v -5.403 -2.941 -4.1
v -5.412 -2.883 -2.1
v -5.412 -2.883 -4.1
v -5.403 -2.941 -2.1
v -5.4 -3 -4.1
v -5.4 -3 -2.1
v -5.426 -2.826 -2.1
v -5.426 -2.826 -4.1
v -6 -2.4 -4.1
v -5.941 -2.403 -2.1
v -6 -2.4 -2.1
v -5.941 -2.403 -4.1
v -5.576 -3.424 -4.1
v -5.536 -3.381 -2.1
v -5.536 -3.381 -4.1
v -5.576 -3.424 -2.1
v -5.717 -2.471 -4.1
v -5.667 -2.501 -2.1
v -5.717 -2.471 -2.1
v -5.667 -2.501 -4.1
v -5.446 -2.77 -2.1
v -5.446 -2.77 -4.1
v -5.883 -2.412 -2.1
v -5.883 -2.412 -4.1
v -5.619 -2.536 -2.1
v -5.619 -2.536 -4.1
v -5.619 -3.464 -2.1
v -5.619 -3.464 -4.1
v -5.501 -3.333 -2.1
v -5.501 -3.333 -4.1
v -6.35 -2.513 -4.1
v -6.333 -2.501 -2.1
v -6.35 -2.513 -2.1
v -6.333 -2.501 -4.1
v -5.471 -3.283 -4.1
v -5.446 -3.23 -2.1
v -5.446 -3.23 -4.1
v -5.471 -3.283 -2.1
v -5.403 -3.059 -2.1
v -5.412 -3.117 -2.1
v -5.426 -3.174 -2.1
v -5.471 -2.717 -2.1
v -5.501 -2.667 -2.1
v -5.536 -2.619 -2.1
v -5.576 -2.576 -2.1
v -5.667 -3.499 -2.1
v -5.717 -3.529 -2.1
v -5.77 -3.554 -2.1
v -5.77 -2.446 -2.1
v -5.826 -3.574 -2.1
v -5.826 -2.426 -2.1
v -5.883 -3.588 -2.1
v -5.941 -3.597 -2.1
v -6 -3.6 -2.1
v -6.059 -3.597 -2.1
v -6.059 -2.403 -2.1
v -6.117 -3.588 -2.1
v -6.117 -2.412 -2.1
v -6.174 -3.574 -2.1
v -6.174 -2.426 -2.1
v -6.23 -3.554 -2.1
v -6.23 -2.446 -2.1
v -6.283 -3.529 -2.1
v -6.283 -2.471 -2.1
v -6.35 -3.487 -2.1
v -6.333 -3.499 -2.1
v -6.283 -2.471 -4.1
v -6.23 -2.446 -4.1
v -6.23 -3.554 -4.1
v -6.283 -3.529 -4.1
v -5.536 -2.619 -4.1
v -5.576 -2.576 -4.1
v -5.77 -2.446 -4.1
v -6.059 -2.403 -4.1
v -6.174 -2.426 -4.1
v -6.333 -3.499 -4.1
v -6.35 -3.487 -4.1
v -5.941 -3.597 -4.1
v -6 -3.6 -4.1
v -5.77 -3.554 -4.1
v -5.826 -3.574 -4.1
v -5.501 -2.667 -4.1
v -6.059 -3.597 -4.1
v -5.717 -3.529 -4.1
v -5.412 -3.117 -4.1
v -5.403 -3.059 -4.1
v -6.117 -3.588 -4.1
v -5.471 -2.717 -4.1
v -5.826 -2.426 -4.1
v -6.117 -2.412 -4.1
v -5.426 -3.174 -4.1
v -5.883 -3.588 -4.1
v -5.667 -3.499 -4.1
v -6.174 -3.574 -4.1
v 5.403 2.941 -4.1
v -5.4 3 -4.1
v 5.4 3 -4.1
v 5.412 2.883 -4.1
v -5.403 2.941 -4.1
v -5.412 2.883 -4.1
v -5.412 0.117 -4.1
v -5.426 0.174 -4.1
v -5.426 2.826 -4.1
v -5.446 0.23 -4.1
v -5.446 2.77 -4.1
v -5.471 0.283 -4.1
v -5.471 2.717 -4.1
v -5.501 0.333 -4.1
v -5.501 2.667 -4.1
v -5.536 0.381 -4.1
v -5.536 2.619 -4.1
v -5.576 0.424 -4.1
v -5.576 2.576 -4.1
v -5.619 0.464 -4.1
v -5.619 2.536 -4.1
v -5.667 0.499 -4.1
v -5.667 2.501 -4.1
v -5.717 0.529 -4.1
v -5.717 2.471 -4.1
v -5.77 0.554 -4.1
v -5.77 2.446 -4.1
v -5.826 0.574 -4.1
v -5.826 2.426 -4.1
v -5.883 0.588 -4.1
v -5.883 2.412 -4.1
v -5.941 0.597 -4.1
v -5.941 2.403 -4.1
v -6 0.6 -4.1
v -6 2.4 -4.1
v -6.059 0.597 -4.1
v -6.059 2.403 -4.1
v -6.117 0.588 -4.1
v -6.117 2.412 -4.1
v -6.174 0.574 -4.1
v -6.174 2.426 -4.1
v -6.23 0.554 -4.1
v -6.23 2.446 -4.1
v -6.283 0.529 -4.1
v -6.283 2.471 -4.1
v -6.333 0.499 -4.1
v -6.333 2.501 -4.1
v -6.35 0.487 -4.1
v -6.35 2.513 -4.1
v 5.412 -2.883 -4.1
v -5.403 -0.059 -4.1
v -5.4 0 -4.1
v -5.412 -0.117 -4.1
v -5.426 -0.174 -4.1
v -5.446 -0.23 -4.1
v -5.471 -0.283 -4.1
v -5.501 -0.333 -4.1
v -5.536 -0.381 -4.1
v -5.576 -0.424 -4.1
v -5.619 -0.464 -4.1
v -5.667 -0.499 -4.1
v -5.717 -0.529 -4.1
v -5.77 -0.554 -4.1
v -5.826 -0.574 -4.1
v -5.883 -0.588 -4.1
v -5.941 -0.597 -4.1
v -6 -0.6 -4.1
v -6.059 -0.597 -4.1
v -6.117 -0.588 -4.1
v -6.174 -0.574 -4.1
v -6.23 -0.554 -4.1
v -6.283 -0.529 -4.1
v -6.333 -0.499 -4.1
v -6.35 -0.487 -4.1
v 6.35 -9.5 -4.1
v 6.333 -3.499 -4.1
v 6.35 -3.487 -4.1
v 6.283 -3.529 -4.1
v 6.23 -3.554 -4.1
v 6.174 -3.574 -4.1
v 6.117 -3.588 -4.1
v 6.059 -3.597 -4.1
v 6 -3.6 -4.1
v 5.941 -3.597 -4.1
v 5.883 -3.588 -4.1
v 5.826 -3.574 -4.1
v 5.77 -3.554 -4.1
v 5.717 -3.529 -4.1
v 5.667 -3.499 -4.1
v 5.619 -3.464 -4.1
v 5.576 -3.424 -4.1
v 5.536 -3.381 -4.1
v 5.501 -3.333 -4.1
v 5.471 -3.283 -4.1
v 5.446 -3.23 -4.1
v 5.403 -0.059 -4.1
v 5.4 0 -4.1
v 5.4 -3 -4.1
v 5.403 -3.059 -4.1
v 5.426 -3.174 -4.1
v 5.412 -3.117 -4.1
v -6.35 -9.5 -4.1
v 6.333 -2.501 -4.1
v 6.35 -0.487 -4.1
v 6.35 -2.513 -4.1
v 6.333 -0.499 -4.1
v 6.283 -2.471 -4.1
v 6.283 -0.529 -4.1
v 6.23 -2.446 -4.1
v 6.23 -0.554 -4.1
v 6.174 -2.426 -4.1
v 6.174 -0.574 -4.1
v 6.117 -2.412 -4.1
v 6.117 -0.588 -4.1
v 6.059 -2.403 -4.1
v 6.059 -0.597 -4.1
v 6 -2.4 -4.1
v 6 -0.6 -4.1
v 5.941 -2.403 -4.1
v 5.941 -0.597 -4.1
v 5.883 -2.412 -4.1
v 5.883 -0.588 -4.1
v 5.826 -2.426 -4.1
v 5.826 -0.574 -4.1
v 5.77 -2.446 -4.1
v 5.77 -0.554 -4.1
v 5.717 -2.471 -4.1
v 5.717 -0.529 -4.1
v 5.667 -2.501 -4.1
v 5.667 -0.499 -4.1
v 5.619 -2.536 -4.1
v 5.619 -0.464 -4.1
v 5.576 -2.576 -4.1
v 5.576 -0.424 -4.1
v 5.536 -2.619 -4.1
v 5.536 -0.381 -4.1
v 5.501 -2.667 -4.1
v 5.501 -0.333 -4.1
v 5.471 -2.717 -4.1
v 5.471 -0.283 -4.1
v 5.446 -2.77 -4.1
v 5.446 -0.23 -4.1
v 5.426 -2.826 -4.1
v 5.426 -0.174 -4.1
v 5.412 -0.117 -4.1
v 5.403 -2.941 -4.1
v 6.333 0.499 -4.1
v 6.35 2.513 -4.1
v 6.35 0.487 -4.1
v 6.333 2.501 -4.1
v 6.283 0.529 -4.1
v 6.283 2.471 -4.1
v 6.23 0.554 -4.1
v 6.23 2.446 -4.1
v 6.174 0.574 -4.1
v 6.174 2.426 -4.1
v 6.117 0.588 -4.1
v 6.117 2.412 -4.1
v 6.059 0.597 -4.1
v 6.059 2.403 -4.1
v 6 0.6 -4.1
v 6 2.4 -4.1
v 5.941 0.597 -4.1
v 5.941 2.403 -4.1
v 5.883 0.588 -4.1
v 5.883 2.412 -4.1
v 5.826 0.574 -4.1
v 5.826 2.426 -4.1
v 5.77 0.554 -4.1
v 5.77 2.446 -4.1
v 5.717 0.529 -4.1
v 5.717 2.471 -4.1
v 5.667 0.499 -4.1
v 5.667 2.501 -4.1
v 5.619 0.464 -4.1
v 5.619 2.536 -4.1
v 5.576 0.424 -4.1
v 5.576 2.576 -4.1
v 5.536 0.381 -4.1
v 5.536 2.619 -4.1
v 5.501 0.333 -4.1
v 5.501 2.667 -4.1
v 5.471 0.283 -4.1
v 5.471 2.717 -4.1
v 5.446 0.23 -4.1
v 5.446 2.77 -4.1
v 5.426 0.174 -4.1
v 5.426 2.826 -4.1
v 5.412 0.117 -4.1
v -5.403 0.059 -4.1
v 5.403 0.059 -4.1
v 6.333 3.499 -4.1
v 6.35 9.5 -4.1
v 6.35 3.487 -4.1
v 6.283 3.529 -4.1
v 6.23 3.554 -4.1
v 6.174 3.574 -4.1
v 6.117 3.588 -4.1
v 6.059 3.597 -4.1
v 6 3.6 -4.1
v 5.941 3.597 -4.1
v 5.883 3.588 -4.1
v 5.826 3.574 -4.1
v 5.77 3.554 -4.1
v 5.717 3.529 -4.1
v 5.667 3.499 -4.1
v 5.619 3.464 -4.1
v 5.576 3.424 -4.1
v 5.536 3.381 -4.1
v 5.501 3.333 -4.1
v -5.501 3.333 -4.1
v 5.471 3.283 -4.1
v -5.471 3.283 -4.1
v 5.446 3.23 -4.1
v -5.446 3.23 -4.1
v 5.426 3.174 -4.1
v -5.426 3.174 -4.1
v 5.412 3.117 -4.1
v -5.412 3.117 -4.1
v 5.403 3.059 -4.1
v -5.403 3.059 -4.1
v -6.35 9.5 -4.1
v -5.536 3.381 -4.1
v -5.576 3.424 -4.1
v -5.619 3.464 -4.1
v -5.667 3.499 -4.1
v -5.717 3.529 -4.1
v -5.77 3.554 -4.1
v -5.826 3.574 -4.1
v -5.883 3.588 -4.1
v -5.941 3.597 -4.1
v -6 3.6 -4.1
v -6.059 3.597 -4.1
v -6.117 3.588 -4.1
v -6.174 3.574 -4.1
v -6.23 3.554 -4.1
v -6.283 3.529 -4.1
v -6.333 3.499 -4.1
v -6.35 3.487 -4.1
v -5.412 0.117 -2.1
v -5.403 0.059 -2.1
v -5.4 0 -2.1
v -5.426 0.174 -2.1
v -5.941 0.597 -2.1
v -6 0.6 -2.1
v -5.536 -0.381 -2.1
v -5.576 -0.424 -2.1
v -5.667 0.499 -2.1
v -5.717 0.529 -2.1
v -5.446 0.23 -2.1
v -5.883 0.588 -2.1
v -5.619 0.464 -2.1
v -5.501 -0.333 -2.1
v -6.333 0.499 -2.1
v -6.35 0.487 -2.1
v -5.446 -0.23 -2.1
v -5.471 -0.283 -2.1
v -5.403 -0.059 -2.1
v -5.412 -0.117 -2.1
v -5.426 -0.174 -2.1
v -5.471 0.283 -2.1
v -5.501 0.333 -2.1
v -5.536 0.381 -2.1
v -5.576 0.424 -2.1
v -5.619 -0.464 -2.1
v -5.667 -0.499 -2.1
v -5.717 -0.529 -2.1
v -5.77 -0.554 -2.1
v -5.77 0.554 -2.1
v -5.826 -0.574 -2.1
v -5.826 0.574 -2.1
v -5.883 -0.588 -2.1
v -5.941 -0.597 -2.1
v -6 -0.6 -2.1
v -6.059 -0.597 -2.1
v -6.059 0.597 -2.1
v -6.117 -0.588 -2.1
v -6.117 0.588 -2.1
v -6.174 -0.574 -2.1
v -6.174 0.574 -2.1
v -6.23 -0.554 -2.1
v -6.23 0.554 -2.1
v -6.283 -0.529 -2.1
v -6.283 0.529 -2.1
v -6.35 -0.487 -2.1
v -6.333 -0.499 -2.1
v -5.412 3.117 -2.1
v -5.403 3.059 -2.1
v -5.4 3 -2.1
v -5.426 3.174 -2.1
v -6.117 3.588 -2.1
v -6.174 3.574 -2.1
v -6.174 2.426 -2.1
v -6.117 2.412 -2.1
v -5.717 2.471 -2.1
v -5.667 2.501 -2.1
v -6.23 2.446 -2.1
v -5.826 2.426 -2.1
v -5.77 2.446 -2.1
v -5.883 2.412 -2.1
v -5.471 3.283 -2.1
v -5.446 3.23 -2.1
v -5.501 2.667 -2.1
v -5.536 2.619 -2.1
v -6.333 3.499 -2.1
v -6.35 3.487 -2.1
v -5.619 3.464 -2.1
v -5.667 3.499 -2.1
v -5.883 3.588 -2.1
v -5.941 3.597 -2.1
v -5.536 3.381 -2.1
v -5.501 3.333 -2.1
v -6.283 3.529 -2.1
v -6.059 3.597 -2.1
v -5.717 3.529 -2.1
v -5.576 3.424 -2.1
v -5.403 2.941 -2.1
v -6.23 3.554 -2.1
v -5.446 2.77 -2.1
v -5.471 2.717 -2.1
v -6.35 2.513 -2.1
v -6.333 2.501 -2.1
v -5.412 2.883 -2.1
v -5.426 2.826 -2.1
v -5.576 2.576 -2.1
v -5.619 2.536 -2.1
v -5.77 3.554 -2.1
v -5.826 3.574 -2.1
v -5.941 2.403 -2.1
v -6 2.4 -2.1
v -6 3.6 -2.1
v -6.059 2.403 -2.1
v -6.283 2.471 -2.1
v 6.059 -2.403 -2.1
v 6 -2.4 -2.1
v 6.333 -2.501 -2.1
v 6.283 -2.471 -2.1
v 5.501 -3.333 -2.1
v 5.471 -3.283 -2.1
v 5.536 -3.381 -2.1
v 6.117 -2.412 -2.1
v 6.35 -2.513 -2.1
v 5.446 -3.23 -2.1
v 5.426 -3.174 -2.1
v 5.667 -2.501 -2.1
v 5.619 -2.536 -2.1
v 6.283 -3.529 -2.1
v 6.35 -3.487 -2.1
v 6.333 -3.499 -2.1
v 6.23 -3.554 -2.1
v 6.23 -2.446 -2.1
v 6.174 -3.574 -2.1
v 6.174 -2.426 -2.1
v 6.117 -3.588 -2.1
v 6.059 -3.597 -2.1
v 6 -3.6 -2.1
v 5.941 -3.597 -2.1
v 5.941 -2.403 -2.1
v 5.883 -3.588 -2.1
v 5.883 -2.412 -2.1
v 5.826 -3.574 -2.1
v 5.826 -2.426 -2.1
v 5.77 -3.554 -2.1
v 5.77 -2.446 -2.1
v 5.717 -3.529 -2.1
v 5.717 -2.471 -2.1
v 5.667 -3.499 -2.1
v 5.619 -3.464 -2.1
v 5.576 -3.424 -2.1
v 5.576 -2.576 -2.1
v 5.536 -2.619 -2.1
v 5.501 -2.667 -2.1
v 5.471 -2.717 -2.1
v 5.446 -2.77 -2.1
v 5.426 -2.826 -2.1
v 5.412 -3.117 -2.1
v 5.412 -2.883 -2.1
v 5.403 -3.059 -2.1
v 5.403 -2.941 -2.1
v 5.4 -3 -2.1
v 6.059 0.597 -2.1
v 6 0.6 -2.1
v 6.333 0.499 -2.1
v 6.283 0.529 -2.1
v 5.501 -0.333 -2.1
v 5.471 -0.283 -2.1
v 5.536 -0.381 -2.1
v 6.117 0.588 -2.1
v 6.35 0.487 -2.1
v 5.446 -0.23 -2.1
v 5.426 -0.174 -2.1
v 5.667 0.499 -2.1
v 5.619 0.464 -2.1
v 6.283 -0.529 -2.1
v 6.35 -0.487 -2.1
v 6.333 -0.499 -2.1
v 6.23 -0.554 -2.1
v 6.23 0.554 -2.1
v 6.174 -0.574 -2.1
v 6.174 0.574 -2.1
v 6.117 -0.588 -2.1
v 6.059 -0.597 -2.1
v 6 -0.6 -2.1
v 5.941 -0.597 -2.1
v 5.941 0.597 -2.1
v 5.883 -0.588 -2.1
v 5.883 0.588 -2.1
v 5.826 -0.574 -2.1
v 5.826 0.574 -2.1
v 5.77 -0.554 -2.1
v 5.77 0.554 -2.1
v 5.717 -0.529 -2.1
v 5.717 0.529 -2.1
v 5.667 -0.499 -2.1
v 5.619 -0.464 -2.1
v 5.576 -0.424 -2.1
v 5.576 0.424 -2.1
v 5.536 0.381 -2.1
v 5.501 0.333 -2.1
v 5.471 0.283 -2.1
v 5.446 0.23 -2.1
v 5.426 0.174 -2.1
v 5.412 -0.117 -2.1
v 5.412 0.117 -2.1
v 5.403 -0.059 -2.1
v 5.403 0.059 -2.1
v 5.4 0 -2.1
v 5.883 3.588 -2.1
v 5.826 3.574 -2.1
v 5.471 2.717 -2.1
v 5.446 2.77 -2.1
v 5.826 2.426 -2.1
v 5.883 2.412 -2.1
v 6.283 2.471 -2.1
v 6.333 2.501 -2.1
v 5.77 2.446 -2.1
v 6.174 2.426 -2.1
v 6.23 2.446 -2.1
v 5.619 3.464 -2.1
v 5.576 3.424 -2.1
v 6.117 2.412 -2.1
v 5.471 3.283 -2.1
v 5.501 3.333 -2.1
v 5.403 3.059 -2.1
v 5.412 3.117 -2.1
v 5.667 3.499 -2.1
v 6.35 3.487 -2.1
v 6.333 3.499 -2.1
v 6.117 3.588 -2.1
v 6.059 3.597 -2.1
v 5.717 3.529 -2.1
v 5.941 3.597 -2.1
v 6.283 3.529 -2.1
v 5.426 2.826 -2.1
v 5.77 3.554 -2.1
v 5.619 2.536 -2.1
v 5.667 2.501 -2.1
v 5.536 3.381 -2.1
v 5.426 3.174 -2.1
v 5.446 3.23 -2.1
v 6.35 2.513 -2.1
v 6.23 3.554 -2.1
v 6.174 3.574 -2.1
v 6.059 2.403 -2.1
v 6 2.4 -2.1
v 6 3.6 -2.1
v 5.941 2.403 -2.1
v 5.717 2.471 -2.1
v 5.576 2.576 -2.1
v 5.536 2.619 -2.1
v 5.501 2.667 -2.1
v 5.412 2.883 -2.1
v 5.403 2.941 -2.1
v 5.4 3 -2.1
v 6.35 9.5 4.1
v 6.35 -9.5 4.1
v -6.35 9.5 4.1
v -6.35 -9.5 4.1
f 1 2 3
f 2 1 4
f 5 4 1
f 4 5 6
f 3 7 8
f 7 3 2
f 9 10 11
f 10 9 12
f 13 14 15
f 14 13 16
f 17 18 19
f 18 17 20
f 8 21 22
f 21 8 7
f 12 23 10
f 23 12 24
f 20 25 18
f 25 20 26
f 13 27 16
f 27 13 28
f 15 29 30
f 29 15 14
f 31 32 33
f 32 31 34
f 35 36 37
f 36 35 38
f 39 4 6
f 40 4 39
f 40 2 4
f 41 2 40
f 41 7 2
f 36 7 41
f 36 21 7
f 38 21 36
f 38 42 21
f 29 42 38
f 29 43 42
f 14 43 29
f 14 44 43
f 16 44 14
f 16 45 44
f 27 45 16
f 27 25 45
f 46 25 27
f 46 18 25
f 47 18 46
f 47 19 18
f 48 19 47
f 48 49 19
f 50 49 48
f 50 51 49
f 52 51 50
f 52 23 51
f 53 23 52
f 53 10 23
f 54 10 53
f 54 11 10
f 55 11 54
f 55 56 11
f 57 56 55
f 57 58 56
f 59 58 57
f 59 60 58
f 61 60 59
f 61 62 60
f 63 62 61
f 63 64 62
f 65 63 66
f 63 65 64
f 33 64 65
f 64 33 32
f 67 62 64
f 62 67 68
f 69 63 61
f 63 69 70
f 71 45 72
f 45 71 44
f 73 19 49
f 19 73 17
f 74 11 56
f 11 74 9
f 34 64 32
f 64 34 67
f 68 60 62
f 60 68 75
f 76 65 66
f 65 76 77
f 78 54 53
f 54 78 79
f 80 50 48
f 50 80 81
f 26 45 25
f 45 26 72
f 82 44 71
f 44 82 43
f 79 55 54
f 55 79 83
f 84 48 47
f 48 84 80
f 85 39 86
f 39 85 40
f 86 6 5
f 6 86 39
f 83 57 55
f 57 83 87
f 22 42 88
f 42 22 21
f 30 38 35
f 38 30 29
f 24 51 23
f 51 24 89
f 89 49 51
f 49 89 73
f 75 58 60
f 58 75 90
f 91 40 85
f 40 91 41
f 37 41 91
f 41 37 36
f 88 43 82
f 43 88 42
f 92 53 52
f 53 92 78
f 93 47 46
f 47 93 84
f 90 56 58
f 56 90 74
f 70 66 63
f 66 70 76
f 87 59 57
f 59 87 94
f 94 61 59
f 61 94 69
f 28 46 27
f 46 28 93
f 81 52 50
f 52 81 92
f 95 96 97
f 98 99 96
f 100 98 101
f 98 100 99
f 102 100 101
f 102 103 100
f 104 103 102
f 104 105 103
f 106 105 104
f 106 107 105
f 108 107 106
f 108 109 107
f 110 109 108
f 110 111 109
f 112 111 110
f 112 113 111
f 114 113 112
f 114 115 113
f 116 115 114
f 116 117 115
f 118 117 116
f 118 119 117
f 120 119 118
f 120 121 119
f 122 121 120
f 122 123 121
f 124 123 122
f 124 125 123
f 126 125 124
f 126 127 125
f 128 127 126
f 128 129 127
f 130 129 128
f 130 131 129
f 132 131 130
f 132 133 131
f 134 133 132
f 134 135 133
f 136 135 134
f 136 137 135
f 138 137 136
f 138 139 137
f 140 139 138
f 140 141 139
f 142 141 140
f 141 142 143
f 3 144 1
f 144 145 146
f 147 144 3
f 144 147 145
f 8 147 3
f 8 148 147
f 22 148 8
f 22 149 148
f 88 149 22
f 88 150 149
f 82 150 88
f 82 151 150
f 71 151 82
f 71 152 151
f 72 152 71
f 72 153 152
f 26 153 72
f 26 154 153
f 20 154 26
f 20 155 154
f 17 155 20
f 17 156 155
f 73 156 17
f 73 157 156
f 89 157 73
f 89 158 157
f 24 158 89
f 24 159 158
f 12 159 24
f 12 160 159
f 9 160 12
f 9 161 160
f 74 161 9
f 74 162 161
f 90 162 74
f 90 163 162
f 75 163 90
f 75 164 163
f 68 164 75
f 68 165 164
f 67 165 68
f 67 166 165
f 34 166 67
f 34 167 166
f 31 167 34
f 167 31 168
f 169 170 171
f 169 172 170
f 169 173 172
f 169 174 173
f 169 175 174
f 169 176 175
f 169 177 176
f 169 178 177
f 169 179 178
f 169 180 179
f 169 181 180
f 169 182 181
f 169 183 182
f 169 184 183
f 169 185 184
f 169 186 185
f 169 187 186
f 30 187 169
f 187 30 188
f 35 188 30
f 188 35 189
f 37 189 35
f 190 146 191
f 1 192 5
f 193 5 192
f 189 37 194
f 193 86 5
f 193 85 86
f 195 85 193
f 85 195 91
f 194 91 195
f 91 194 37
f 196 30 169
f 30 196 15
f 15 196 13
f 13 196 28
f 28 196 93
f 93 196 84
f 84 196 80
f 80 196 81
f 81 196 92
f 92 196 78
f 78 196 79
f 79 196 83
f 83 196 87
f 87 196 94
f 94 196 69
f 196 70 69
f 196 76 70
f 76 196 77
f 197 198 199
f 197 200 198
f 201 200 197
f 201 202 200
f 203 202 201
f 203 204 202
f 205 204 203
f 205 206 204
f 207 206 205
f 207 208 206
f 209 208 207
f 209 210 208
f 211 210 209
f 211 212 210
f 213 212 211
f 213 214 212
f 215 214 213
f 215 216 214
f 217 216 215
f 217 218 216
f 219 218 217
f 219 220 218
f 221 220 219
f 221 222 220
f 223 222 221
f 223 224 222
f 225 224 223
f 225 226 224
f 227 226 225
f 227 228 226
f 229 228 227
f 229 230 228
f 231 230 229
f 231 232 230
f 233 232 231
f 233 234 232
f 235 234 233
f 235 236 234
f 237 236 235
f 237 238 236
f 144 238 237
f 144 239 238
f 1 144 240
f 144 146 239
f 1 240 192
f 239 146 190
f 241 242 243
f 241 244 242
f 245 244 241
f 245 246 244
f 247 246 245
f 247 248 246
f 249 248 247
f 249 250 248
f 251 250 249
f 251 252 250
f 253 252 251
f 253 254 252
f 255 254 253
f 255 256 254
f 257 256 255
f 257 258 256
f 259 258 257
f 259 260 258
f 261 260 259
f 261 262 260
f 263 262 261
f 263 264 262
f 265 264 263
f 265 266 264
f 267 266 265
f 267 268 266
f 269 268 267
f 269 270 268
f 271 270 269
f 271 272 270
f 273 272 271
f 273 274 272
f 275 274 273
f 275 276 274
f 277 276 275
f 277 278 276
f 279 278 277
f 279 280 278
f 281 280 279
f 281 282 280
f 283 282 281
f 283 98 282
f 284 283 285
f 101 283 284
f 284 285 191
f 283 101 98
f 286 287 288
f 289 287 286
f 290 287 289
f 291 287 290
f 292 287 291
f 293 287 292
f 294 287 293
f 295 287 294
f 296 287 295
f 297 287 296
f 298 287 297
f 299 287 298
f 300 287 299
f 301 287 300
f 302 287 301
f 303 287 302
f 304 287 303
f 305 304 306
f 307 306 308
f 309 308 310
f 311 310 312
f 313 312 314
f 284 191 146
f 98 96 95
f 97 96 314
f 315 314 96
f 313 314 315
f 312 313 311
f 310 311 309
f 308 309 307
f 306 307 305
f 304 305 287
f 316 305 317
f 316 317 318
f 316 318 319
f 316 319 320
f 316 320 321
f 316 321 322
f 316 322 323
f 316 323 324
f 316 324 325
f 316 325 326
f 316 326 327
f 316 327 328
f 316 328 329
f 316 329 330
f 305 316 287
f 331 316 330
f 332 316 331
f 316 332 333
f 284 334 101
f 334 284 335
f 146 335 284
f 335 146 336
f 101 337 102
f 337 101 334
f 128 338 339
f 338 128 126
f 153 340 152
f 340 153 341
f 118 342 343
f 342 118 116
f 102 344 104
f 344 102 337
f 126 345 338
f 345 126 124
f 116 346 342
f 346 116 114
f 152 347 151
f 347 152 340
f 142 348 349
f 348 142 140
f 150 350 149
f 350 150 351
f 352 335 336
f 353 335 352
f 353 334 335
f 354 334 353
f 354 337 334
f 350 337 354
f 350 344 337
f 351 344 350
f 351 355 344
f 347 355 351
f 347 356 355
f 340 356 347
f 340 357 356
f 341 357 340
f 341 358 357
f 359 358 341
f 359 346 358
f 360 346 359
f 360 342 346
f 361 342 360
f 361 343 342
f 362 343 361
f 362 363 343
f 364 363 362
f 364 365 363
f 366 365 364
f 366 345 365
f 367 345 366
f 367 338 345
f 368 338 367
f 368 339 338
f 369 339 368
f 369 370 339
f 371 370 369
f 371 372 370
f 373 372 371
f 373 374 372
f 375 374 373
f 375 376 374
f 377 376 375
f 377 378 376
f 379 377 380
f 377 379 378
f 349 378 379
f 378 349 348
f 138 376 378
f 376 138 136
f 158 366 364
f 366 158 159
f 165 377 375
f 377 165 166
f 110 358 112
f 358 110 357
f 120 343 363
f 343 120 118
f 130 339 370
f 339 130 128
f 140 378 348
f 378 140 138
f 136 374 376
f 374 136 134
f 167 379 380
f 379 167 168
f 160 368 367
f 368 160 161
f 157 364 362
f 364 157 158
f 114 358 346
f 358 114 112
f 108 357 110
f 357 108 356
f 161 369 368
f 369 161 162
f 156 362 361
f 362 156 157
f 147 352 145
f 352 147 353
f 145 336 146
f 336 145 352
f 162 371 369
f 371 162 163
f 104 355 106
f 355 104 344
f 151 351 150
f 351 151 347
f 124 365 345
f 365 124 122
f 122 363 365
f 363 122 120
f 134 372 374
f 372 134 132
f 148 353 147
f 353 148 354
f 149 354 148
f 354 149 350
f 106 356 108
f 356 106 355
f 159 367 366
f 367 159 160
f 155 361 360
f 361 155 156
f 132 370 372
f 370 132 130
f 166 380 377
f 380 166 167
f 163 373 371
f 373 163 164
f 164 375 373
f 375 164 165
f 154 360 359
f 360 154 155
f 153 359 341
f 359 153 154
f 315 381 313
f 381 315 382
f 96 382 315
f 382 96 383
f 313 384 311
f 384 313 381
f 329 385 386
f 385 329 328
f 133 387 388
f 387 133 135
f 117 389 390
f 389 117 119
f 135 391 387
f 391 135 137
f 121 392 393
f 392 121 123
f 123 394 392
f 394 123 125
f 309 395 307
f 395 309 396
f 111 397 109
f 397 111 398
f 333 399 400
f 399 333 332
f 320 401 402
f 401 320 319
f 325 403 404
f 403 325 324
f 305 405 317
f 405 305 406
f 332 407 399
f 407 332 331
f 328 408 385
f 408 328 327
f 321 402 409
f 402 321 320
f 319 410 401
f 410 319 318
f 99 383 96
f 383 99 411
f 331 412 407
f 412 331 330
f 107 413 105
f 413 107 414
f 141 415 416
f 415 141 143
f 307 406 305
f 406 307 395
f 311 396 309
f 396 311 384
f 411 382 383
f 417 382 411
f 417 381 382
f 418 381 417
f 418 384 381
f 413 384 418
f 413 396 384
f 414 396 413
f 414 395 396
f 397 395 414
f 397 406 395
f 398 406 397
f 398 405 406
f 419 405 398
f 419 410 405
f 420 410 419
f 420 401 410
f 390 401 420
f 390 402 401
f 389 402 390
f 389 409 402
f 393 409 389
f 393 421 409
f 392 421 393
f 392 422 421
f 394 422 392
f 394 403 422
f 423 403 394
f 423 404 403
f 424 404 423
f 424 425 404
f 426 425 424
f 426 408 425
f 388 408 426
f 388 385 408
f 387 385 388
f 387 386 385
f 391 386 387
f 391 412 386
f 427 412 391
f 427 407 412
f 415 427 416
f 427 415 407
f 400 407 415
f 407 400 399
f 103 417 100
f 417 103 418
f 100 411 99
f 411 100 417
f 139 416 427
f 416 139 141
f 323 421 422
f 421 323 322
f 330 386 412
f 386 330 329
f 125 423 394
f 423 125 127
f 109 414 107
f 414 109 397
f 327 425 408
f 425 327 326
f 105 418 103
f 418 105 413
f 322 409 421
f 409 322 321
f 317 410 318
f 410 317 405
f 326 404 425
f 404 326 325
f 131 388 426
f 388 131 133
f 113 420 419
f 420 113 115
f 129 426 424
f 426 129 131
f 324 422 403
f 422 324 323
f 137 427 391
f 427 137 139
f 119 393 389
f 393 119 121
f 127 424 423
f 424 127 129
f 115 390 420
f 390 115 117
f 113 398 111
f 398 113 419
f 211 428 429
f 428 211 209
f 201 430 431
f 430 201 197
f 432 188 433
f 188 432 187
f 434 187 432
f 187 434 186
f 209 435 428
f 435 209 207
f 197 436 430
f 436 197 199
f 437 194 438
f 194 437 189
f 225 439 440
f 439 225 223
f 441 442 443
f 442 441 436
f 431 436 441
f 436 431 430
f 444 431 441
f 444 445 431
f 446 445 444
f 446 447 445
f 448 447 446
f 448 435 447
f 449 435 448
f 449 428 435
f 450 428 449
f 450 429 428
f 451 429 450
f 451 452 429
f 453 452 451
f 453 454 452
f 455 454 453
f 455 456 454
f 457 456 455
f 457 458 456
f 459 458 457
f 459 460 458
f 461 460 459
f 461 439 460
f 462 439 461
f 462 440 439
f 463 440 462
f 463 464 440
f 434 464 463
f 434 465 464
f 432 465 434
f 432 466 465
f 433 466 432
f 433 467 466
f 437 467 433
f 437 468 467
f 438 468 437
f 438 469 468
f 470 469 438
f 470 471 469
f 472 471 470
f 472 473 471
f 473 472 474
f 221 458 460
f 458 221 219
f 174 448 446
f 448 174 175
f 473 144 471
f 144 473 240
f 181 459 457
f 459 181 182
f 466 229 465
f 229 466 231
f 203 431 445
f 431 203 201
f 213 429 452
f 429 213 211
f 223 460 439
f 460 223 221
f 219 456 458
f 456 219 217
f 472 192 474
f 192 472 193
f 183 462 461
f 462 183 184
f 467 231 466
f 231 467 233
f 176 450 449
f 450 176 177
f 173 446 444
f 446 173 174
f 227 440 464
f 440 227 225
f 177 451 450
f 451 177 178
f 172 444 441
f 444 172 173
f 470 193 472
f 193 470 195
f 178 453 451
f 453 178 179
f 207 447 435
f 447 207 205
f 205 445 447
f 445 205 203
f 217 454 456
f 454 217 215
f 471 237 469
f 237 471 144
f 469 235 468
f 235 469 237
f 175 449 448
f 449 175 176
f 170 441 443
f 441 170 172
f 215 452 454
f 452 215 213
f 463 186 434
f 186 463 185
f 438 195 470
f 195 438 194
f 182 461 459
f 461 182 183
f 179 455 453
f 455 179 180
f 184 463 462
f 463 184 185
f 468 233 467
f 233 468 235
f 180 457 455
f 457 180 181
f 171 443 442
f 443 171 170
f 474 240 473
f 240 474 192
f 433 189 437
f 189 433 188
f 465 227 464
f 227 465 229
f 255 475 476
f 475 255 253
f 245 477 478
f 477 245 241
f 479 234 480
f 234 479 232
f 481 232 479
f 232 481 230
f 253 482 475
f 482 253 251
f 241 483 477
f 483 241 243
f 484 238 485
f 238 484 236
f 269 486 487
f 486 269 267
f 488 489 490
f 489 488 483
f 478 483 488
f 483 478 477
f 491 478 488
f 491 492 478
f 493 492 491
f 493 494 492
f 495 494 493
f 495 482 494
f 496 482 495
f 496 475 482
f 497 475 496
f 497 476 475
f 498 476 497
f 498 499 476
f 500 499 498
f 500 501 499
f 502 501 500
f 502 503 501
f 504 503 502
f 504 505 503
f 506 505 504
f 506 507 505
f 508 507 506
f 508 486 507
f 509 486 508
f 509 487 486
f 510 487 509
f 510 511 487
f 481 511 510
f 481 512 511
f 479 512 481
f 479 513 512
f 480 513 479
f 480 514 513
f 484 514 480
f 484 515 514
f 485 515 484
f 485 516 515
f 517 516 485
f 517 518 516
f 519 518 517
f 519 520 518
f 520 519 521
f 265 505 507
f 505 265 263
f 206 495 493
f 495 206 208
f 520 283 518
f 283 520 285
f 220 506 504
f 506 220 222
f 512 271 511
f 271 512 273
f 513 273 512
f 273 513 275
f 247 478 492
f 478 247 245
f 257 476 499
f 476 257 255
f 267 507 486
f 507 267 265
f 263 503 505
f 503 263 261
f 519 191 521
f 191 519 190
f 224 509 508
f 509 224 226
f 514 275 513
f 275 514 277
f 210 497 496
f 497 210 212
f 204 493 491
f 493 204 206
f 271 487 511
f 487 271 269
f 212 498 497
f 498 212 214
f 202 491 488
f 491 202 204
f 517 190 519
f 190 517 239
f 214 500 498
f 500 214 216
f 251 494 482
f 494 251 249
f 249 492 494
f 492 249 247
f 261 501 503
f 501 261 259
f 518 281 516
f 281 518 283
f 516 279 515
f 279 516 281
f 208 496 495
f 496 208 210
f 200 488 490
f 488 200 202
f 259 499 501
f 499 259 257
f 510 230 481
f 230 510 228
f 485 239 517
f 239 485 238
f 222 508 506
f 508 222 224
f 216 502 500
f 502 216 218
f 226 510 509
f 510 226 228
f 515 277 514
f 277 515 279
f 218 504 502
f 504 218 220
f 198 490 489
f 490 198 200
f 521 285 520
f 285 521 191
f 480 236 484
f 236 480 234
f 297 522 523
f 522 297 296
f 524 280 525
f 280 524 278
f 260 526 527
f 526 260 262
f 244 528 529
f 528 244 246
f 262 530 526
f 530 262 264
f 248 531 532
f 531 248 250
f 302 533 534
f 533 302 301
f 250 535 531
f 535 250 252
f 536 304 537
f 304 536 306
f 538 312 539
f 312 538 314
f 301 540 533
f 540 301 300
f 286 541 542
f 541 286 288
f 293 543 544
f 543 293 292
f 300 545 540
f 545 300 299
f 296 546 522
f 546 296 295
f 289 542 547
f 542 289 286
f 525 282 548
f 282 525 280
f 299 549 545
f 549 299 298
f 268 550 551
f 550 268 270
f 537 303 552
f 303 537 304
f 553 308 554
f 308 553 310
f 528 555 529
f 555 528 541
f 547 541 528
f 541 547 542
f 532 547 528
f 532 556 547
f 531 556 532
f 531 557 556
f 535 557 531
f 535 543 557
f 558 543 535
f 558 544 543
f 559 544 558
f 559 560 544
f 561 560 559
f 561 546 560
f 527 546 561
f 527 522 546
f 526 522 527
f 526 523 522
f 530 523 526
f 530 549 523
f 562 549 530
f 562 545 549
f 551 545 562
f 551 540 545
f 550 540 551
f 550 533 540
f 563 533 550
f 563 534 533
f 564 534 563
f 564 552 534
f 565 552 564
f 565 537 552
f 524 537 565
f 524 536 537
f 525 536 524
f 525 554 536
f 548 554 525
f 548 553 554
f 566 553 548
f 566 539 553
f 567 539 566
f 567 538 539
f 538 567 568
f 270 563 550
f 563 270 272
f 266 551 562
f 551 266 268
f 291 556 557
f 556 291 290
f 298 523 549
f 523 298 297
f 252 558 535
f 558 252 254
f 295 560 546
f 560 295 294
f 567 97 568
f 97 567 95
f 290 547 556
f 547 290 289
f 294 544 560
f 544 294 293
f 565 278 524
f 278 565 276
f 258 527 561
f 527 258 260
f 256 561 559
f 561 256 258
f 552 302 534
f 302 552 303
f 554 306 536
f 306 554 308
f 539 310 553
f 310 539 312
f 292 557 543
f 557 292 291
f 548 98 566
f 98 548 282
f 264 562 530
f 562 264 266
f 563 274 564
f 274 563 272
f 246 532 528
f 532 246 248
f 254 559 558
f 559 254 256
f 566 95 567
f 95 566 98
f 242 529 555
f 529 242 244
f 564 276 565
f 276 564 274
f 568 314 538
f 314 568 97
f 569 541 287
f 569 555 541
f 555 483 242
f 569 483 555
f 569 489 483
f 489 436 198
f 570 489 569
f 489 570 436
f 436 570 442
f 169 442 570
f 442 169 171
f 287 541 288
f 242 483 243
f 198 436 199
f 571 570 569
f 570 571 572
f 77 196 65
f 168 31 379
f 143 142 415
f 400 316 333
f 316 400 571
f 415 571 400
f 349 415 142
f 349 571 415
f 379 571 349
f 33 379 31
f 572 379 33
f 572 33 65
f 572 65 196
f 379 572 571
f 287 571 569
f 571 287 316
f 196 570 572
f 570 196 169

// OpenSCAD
// Define a module for a single segment of the seven-segment display
module segment() {
    cube([1.2, 12.7, 1.2], center = true);
}

// Define a module for the seven-segment digit
module seven_segment_digit() {
    translate([0, 0, 0.6])
    union() {
        // Horizontal segments
        translate([0, 6.35, 0]) segment();
        translate([0, -6.35, 0]) segment();
        translate([0, 0, 0]) segment();
        
        // Vertical segments
        rotate([0, 0, 90]) {
            translate([-3.0, 3.175, 0]) segment();
            translate([3.0, 3.175, 0]) segment();
            translate([-3.0, -3.175, 0]) segment();
            translate([3.0, -3.175, 0]) segment();
        }
    }
}

// Define a module for the LED display body
module display_body() {
    cube([12.7, 19, 8.2], center = true);
}

// Define a module for the pin grid
module pin_grid() {
    for (x = [-2, 2])
    for (y = [-1, 0, 1])
    translate([x * 3, y * 3, -4.1])
    cylinder(h = 2, r = 0.6, $fn = 64);
}

// Combine all parts to form the LED display module
module led_display_module() {
    difference() {
        display_body();
        translate([0, 0, 4.1]) seven_segment_digit();
        pin_grid();
    }
}

// Render the LED display module
translate([0, 0, 0]) led_display_module();
